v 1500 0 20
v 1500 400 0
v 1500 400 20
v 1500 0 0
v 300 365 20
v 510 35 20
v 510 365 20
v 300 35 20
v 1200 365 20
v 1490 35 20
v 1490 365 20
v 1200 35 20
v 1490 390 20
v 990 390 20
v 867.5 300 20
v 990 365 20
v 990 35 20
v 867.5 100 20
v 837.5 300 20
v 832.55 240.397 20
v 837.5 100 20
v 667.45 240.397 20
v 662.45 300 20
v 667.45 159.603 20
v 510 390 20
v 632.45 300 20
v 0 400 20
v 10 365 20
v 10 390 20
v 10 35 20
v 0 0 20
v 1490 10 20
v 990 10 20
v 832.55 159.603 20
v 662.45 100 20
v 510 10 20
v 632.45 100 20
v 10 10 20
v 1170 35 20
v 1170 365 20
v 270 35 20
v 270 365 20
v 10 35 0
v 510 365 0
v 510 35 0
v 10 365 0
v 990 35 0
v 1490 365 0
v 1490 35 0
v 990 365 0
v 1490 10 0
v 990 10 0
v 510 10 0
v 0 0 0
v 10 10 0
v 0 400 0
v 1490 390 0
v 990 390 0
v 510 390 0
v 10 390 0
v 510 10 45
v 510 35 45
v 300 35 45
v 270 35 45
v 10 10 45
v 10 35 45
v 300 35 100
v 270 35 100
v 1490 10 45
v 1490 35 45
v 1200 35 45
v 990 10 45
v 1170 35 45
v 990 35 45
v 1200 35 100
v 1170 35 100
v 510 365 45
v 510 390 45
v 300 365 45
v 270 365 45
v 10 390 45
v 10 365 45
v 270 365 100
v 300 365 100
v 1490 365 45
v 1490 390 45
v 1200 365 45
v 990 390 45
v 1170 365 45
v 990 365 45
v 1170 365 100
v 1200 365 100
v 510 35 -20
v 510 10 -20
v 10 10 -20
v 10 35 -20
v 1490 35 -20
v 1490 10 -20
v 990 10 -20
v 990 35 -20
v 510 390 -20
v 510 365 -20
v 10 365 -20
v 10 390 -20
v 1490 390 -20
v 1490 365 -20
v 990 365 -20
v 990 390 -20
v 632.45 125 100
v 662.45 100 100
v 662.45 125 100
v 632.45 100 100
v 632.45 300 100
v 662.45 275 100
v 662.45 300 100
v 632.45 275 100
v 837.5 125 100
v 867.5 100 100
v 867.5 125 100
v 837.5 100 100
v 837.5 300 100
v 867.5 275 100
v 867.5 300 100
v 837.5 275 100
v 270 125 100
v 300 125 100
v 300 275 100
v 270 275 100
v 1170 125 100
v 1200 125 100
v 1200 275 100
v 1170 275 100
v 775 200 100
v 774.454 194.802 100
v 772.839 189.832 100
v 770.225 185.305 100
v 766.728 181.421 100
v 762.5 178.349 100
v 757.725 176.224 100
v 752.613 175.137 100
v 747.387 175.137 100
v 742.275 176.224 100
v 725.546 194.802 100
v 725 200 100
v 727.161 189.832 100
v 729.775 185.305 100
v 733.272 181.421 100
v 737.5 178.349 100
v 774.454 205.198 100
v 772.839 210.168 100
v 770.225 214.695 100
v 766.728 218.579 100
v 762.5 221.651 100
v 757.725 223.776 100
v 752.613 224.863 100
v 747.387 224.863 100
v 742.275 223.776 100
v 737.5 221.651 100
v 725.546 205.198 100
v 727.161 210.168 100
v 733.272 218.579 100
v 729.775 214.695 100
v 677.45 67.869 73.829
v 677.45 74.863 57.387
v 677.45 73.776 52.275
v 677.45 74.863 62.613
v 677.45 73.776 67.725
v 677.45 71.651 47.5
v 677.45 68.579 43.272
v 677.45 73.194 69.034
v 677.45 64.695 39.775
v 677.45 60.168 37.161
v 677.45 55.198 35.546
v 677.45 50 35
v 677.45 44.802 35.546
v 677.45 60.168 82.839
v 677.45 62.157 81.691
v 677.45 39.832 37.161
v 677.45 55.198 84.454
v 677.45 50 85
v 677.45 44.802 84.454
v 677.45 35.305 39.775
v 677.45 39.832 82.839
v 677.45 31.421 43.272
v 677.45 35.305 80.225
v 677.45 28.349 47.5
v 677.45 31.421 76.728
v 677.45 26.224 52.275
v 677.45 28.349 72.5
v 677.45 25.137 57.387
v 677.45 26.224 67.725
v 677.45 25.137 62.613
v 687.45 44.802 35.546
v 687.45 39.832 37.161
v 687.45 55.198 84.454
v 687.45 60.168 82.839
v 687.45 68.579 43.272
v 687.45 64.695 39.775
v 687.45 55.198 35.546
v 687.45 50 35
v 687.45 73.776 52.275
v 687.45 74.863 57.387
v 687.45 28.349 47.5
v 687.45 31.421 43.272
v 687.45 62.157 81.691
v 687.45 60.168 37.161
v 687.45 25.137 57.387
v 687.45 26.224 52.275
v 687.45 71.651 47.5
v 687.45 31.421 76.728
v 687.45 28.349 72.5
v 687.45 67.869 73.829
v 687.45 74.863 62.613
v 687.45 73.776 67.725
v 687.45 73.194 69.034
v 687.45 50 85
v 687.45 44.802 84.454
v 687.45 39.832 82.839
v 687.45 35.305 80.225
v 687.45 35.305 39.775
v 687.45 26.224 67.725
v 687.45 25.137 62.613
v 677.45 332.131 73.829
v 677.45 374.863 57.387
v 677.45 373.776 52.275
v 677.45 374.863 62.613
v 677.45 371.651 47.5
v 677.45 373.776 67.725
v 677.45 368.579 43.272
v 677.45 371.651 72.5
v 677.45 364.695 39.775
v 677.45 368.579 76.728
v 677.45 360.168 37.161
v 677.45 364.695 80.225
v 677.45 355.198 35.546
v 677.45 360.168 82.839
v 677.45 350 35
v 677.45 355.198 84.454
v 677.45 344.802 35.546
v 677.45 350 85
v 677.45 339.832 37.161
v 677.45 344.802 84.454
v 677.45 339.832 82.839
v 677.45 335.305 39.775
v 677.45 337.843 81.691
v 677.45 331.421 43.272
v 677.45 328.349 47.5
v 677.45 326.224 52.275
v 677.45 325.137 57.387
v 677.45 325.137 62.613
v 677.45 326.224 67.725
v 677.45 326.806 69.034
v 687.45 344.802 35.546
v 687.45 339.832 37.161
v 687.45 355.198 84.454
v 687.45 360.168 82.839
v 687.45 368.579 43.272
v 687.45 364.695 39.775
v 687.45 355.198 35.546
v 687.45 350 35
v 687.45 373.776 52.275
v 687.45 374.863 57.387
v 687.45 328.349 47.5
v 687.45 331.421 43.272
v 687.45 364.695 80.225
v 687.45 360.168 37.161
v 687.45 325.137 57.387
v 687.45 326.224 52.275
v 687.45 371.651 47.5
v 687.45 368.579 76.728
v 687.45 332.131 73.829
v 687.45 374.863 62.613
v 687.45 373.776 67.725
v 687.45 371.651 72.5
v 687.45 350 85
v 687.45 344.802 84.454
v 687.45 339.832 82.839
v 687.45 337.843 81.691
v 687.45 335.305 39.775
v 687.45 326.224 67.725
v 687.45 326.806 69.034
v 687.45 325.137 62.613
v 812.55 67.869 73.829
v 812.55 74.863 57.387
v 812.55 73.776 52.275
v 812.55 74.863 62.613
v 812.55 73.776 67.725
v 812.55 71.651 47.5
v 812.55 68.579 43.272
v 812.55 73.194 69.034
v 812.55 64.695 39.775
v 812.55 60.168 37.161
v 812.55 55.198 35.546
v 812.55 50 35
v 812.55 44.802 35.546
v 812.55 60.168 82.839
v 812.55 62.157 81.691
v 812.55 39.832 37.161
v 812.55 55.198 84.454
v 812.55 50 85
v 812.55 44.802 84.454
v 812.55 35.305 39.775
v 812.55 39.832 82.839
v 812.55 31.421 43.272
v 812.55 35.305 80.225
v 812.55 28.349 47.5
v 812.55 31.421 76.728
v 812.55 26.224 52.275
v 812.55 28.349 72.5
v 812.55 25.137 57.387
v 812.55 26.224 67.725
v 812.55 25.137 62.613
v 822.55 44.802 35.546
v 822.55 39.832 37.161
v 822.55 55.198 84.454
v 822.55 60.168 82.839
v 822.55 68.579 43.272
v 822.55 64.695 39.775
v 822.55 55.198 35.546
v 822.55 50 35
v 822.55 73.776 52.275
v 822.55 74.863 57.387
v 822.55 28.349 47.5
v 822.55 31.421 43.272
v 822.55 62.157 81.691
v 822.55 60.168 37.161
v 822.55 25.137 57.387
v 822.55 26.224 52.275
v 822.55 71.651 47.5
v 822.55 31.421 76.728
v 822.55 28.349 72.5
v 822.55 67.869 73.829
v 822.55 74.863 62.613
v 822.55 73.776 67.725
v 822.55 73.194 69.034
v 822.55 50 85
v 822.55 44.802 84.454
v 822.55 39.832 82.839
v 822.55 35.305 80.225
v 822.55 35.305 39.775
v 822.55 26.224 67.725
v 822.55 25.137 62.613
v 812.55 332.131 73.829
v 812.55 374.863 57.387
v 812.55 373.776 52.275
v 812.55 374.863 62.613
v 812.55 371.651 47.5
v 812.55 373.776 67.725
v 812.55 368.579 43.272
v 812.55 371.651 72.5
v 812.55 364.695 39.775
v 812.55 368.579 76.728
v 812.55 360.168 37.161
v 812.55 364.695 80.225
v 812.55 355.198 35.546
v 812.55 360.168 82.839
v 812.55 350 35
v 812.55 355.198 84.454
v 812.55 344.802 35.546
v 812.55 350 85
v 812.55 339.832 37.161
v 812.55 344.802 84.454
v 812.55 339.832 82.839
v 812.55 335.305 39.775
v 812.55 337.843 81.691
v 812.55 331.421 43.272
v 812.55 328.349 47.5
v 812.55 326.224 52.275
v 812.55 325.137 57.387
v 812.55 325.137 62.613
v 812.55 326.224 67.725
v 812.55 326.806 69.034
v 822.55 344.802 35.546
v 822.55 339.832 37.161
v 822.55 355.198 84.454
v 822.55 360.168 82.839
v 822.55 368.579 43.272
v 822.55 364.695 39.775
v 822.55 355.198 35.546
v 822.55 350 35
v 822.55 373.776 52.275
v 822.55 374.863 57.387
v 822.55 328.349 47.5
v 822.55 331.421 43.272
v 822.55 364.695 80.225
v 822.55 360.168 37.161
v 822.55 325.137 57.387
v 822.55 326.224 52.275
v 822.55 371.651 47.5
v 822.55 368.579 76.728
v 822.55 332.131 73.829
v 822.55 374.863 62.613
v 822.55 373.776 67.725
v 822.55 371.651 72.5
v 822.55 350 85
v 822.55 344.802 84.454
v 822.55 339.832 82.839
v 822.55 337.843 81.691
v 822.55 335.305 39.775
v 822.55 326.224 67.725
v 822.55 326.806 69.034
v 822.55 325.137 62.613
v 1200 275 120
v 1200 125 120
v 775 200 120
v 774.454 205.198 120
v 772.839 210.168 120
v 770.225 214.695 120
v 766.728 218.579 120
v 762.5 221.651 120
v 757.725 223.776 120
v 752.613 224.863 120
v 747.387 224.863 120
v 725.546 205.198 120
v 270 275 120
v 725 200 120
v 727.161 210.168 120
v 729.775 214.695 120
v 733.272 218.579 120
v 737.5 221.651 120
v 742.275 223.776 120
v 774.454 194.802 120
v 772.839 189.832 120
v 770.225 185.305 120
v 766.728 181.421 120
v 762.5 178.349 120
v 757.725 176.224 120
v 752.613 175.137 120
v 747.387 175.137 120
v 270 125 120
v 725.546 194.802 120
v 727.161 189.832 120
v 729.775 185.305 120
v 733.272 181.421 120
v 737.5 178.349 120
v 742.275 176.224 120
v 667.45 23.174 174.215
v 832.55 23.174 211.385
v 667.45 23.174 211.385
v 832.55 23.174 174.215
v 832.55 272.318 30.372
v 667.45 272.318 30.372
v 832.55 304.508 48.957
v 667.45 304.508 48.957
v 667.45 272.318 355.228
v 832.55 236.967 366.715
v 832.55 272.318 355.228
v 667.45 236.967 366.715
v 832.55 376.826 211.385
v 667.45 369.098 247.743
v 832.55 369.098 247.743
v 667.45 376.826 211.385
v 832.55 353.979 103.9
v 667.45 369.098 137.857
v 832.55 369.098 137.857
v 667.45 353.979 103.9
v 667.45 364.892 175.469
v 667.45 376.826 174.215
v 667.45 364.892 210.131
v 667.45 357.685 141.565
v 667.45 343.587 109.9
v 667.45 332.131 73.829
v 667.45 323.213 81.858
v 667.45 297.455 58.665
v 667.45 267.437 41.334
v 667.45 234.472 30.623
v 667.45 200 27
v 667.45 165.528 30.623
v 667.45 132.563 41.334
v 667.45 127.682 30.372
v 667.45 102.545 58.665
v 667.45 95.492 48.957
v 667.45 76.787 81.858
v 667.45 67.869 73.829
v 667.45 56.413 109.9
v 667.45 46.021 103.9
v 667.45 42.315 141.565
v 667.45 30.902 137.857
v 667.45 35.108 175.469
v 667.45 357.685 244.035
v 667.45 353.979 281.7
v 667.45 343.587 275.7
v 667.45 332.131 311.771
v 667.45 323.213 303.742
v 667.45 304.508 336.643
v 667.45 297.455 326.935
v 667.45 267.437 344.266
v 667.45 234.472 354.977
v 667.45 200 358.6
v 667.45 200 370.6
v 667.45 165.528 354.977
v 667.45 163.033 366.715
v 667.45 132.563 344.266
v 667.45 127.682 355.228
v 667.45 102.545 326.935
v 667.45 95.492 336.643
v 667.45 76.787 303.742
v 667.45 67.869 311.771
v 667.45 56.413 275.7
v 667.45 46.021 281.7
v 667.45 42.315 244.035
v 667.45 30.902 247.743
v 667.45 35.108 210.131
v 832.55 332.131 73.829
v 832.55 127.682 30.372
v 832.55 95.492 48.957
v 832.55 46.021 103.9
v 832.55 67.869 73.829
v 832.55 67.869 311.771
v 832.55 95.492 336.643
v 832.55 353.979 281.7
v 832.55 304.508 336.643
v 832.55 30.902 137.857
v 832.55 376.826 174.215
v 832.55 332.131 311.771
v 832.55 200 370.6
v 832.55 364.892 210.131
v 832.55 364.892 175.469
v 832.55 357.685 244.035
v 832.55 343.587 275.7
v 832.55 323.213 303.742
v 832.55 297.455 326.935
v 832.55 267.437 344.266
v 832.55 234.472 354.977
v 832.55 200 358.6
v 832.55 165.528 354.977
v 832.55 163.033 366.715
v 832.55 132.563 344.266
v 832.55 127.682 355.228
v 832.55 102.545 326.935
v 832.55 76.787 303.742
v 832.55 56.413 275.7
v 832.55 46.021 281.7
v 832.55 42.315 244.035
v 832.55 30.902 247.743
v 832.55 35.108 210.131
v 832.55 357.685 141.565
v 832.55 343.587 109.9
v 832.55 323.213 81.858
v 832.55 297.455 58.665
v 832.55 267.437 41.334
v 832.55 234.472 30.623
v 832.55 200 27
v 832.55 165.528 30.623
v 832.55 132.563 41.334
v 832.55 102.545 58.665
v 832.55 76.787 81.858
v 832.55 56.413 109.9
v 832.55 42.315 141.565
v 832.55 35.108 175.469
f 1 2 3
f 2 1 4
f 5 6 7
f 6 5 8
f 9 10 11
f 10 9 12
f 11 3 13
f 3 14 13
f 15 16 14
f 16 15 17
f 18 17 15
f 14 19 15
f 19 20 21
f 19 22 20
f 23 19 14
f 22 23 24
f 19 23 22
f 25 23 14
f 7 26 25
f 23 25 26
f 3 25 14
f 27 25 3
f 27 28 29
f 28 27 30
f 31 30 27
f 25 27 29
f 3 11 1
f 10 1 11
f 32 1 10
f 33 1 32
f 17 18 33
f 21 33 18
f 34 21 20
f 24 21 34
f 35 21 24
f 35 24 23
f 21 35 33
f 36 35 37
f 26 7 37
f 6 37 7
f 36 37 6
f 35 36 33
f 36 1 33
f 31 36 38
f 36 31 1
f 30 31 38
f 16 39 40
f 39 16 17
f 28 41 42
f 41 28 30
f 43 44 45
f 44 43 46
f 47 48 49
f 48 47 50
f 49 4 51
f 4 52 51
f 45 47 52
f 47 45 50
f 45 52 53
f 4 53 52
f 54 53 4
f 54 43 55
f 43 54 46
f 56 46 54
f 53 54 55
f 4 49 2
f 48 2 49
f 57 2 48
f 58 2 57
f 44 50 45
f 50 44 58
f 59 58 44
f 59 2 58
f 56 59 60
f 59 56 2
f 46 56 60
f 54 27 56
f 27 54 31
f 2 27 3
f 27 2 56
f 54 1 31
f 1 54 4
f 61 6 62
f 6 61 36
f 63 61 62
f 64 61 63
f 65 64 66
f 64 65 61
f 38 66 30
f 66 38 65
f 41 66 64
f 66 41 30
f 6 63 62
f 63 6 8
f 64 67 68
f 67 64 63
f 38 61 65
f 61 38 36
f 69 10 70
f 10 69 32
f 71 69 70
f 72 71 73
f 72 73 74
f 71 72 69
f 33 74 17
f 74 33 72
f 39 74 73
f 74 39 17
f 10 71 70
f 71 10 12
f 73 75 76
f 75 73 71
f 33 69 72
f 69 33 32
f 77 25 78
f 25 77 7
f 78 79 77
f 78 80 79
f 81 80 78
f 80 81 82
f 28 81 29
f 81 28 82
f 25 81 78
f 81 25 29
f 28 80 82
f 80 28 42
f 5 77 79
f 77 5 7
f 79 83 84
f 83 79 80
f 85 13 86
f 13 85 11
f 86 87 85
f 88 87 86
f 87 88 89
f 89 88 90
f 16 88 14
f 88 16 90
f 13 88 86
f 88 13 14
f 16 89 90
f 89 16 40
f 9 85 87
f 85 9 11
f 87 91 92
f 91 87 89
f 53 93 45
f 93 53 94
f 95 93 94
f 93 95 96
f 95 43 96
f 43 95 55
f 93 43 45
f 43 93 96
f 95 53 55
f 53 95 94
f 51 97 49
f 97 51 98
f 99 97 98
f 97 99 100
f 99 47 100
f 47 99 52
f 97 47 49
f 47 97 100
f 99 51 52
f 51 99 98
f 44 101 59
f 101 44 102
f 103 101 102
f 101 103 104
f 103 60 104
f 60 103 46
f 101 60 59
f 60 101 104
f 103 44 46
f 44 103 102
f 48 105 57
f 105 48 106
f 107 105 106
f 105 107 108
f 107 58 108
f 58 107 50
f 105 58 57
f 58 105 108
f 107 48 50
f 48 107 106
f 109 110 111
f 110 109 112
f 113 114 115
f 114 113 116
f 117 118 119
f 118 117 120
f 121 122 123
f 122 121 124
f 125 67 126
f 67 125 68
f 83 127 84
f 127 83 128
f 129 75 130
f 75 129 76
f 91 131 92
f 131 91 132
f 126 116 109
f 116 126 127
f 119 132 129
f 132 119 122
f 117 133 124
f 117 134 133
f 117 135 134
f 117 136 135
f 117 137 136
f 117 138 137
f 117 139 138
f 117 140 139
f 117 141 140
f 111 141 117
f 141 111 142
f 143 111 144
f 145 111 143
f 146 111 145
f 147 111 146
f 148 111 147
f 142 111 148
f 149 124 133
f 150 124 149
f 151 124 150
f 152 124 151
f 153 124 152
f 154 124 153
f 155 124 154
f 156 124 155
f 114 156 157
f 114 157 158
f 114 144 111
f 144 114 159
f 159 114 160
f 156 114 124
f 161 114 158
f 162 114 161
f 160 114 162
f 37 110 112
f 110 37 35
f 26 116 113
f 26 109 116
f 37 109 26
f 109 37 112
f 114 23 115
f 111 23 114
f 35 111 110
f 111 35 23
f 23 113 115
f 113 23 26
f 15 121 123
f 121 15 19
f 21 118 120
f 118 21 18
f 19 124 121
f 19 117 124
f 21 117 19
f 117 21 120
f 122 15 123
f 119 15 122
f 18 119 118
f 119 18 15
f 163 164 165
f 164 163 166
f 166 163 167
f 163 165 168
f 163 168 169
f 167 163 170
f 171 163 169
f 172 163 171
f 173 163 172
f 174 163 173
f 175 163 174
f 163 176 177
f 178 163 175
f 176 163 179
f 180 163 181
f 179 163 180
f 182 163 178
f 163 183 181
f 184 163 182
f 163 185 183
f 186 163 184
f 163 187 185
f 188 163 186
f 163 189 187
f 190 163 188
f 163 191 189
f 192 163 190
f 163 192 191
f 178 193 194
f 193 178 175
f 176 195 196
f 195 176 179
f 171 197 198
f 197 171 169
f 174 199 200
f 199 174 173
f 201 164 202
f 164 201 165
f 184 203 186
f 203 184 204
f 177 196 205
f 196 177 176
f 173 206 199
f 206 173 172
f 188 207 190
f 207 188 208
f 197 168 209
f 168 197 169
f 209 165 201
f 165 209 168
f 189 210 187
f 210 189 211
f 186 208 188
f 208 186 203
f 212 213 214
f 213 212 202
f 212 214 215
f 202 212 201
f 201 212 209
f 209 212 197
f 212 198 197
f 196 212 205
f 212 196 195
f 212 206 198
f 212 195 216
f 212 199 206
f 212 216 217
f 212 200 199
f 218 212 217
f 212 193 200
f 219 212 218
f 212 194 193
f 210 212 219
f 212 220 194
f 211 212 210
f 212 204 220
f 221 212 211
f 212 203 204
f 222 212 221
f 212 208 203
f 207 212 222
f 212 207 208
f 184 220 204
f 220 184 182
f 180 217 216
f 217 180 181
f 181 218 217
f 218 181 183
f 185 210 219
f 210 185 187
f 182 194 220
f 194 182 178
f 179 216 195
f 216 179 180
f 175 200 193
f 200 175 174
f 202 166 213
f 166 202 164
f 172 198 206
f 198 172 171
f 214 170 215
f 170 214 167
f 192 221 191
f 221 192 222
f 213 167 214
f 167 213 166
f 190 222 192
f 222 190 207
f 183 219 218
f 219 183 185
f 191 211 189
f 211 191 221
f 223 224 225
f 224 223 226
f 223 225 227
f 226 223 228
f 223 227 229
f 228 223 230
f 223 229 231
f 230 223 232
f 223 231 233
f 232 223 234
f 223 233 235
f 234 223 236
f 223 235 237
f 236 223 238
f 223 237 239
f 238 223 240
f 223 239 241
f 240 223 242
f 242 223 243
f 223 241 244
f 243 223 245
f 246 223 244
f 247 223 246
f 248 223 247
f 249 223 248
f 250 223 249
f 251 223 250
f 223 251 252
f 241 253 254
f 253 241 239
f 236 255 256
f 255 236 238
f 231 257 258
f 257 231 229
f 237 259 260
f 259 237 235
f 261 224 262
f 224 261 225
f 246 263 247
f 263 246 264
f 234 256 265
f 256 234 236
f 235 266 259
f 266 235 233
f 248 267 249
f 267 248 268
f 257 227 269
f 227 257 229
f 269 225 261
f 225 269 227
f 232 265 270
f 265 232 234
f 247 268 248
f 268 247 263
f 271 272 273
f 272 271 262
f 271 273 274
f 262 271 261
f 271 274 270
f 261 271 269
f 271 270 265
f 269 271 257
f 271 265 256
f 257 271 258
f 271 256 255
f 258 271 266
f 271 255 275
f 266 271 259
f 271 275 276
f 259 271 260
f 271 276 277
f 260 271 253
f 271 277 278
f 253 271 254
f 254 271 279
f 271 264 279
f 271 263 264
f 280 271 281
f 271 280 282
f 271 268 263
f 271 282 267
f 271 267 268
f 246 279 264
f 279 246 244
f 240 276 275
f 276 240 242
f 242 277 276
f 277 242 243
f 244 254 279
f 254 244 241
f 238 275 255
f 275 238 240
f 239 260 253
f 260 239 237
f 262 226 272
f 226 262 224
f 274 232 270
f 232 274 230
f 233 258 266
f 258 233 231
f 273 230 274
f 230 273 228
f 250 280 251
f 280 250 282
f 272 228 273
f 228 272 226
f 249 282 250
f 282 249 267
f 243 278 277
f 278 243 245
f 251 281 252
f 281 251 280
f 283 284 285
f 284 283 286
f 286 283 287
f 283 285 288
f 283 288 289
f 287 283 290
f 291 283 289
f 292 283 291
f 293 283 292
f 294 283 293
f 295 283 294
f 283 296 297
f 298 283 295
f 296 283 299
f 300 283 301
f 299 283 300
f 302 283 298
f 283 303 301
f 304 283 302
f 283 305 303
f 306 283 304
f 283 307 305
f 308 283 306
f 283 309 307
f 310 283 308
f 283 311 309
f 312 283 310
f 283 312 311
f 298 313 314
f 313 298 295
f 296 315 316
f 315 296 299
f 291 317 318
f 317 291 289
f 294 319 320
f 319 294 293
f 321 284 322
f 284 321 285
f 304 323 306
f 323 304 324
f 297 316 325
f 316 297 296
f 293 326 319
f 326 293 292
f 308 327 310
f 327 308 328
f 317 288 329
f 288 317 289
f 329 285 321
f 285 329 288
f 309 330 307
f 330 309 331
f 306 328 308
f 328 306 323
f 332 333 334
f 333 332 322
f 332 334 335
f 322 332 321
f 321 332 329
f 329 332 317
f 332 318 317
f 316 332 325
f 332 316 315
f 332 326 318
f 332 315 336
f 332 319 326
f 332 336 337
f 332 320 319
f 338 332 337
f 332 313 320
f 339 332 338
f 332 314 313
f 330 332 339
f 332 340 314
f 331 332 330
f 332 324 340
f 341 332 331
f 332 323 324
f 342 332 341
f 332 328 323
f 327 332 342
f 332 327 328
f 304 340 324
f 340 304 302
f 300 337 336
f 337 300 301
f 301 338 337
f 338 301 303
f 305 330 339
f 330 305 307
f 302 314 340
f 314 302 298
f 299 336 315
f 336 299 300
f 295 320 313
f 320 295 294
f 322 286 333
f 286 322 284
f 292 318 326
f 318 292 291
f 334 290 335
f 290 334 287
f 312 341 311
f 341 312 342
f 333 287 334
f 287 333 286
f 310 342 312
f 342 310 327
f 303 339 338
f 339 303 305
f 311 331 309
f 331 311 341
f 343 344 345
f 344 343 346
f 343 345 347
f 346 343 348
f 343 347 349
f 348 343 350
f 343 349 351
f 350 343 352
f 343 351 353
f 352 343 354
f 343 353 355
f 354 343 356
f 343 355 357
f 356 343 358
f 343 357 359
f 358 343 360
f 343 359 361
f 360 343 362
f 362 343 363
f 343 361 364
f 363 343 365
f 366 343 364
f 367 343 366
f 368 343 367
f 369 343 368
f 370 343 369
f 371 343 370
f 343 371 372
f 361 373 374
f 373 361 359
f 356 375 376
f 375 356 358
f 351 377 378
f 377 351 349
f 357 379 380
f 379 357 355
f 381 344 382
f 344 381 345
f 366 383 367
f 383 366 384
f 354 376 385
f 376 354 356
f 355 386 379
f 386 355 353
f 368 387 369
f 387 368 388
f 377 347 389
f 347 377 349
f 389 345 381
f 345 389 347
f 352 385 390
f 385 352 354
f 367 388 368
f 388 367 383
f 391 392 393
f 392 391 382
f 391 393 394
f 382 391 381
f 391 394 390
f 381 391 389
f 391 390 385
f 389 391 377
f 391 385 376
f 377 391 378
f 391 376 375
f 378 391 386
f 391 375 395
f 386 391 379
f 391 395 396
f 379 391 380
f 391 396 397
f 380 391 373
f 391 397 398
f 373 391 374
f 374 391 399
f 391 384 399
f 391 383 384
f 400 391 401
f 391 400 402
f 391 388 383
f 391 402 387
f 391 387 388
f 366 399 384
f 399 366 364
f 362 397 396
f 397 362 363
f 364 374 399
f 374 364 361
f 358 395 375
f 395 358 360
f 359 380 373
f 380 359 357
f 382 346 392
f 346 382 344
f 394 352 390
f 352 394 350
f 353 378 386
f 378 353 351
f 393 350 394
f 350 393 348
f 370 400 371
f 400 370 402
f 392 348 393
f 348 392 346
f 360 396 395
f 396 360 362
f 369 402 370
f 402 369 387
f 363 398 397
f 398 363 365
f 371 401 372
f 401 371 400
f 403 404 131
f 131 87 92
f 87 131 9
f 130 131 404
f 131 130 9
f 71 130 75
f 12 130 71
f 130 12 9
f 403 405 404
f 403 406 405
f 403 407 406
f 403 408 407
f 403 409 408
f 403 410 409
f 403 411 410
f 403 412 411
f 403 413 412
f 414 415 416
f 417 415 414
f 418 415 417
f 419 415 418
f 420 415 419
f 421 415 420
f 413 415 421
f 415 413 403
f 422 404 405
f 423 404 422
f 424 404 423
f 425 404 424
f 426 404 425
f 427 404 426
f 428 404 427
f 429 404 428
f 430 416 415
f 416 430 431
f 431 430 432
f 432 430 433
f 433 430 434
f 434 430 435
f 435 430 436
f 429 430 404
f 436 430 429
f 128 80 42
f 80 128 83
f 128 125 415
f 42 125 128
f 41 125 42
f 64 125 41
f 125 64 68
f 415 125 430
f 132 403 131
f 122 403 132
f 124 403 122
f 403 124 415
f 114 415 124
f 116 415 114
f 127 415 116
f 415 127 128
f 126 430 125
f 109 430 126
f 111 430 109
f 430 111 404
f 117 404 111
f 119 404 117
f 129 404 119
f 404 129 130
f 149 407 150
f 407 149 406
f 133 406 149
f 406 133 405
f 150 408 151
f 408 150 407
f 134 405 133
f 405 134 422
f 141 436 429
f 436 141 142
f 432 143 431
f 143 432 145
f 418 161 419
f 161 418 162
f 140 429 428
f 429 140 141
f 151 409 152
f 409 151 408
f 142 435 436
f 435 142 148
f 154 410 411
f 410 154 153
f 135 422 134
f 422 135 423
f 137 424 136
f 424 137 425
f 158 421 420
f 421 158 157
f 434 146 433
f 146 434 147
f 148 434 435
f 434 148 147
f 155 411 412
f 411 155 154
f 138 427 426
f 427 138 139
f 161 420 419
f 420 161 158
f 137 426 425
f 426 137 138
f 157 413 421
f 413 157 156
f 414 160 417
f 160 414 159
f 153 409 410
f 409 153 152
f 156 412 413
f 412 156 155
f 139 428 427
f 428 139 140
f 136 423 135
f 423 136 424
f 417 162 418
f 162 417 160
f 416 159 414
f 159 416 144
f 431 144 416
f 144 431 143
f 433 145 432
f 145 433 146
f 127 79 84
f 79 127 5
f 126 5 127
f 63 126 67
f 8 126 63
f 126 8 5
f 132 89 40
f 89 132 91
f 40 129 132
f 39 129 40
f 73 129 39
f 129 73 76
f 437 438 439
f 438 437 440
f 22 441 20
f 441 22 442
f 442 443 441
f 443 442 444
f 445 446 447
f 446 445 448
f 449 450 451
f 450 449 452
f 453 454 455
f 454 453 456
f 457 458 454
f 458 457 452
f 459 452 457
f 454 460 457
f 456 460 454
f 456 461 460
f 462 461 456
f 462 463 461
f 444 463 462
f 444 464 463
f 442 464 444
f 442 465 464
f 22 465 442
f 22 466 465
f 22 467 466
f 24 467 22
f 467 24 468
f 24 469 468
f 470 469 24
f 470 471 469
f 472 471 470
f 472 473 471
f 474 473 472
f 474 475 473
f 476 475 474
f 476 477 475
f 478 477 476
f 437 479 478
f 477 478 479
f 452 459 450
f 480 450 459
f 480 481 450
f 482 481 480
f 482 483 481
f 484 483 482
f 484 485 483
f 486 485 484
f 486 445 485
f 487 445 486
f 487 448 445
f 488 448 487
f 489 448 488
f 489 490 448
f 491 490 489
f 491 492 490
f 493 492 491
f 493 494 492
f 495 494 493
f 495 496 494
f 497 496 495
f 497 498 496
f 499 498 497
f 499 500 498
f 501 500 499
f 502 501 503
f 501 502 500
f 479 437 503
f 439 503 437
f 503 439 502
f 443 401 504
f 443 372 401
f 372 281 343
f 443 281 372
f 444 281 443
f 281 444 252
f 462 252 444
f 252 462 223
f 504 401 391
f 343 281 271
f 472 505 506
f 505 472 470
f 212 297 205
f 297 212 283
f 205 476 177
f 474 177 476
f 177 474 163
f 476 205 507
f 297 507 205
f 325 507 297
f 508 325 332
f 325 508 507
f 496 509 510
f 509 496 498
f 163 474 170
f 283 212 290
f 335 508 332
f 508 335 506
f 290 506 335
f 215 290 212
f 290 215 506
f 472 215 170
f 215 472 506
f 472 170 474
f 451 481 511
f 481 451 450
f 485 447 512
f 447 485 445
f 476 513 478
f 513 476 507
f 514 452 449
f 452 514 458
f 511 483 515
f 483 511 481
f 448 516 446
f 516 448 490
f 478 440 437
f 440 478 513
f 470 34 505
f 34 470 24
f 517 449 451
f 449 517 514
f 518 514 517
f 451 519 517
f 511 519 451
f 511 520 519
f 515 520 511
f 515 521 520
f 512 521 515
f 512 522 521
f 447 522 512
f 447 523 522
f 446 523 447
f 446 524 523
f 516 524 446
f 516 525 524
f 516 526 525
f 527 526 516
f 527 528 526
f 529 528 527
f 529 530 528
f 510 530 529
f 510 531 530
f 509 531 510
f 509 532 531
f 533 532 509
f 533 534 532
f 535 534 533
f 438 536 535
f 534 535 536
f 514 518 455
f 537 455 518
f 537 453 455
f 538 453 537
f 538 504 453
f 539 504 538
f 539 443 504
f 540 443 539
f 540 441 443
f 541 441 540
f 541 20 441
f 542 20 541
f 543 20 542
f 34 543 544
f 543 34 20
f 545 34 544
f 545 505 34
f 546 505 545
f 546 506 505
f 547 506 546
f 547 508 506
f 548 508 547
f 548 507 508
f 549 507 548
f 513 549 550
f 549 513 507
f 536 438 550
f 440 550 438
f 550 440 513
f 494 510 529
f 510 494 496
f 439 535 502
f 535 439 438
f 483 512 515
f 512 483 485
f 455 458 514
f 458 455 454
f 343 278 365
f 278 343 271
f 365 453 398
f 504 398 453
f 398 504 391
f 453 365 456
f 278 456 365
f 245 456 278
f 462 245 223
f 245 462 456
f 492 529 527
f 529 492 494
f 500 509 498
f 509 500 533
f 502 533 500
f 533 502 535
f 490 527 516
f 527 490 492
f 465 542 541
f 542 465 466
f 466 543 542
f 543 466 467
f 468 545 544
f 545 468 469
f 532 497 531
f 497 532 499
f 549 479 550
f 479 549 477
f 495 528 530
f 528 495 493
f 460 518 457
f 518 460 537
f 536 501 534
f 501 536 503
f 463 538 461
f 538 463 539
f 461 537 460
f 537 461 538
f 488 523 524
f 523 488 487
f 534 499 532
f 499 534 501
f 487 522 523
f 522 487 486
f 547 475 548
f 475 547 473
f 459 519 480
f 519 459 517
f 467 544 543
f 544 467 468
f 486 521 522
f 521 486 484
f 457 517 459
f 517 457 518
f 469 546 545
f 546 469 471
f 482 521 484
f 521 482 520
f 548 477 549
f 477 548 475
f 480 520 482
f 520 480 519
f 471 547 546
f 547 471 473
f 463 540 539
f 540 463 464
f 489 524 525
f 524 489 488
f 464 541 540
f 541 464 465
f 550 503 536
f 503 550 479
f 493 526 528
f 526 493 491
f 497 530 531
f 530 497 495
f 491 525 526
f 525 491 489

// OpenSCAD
module base()
{
	// Base board
	color([1.0, 1.0, 1.0])
		cube([1500, 400, 20]);

	// Runners for router
	translate([10, 10, 20])
		color([1.0, 1.0, 1.0])
		cube([500, 25, 25]);
	translate([990, 10, 20])
		color([1.0, 1.0, 1.0])
		cube([500, 25, 25]);
	translate([10, 365, 20])
		color([1.0, 1.0, 1.0])
		cube([500, 25, 25]);
	translate([990, 365, 20])
		color([1.0, 1.0, 1.0])
		cube([500, 25, 25]);

	// Sockets at the bottom of the board
	translate([10, 10, -20])
		color([1.0, 1.0, 1.0])
		cube([500, 25, 25]);
	translate([990, 10, -20])
		color([1.0, 1.0, 1.0])
		cube([500, 25, 25]);
	translate([10, 365, -20])
		color([1.0, 1.0, 1.0])
		cube([500, 25, 25]);
	translate([990, 365, -20])
		color([1.0, 1.0, 1.0])
		cube([500, 25, 25]);
}

module shell_holder()
{
	// Runners for drum shell
	translate([662.45, 100, 20])
		rotate(90)
		color([0.8, 0.6, 0.4])
		cube([200, 30, 80]);
	translate([867.5, 100, 20])
		rotate(90)
		color([0.8, 0.6, 0.4])
		cube([200, 30, 80]);

	// Wheel 1
	translate([682.45, 50, 60])
		rotate([0, 90, 0])
	cylinder(10, 25, 25, true);

	// Wheel 2
	translate([682.45, 350, 60])
		rotate([0, 90, 0])
	cylinder(10, 25, 25, true);

	// Wheel 3
	translate([817.55, 50, 60])
		rotate([0, 90, 0])
	cylinder(10, 25, 25, true);

	// Wheel 4
	translate([817.55, 350, 60])
		rotate([0, 90, 0])
	cylinder(10, 25, 25, true);	
}

module router_mount()
{
	// Runners
	translate([300, 35, 20])
		color([0.8, 0.6, 0.4])
		rotate(90)
		cube([330, 30, 80]);
	translate([1200, 35, 20])
		color([0.8, 0.6, 0.4])
		rotate(90)
		cube([330, 30, 80]);	

	// Mount board
	difference() {
		translate([270, 125, 100])
			color([0, 0, 0])
			cube([930, 150, 20]);

		// Hole for cutter head
		translate([750, 200, 110])
			cylinder(40, 25, 25, true);
	}
}

module shell()
{
	// Example drum shell (14"x6.5")
	d = 14 * 2.54 * 10;
	h = 6.5 * 2.54 * 10;

	translate([750, 200, d / 2 + 15])
	rotate([0, 90, 0])
	difference() {
		cylinder(h, d / 2, d / 2, true);
		cylinder(h + 20, d / 2 - 12, d / 2 - 12, true);
	}
}

base();
shell_holder();
router_mount();
shell();
